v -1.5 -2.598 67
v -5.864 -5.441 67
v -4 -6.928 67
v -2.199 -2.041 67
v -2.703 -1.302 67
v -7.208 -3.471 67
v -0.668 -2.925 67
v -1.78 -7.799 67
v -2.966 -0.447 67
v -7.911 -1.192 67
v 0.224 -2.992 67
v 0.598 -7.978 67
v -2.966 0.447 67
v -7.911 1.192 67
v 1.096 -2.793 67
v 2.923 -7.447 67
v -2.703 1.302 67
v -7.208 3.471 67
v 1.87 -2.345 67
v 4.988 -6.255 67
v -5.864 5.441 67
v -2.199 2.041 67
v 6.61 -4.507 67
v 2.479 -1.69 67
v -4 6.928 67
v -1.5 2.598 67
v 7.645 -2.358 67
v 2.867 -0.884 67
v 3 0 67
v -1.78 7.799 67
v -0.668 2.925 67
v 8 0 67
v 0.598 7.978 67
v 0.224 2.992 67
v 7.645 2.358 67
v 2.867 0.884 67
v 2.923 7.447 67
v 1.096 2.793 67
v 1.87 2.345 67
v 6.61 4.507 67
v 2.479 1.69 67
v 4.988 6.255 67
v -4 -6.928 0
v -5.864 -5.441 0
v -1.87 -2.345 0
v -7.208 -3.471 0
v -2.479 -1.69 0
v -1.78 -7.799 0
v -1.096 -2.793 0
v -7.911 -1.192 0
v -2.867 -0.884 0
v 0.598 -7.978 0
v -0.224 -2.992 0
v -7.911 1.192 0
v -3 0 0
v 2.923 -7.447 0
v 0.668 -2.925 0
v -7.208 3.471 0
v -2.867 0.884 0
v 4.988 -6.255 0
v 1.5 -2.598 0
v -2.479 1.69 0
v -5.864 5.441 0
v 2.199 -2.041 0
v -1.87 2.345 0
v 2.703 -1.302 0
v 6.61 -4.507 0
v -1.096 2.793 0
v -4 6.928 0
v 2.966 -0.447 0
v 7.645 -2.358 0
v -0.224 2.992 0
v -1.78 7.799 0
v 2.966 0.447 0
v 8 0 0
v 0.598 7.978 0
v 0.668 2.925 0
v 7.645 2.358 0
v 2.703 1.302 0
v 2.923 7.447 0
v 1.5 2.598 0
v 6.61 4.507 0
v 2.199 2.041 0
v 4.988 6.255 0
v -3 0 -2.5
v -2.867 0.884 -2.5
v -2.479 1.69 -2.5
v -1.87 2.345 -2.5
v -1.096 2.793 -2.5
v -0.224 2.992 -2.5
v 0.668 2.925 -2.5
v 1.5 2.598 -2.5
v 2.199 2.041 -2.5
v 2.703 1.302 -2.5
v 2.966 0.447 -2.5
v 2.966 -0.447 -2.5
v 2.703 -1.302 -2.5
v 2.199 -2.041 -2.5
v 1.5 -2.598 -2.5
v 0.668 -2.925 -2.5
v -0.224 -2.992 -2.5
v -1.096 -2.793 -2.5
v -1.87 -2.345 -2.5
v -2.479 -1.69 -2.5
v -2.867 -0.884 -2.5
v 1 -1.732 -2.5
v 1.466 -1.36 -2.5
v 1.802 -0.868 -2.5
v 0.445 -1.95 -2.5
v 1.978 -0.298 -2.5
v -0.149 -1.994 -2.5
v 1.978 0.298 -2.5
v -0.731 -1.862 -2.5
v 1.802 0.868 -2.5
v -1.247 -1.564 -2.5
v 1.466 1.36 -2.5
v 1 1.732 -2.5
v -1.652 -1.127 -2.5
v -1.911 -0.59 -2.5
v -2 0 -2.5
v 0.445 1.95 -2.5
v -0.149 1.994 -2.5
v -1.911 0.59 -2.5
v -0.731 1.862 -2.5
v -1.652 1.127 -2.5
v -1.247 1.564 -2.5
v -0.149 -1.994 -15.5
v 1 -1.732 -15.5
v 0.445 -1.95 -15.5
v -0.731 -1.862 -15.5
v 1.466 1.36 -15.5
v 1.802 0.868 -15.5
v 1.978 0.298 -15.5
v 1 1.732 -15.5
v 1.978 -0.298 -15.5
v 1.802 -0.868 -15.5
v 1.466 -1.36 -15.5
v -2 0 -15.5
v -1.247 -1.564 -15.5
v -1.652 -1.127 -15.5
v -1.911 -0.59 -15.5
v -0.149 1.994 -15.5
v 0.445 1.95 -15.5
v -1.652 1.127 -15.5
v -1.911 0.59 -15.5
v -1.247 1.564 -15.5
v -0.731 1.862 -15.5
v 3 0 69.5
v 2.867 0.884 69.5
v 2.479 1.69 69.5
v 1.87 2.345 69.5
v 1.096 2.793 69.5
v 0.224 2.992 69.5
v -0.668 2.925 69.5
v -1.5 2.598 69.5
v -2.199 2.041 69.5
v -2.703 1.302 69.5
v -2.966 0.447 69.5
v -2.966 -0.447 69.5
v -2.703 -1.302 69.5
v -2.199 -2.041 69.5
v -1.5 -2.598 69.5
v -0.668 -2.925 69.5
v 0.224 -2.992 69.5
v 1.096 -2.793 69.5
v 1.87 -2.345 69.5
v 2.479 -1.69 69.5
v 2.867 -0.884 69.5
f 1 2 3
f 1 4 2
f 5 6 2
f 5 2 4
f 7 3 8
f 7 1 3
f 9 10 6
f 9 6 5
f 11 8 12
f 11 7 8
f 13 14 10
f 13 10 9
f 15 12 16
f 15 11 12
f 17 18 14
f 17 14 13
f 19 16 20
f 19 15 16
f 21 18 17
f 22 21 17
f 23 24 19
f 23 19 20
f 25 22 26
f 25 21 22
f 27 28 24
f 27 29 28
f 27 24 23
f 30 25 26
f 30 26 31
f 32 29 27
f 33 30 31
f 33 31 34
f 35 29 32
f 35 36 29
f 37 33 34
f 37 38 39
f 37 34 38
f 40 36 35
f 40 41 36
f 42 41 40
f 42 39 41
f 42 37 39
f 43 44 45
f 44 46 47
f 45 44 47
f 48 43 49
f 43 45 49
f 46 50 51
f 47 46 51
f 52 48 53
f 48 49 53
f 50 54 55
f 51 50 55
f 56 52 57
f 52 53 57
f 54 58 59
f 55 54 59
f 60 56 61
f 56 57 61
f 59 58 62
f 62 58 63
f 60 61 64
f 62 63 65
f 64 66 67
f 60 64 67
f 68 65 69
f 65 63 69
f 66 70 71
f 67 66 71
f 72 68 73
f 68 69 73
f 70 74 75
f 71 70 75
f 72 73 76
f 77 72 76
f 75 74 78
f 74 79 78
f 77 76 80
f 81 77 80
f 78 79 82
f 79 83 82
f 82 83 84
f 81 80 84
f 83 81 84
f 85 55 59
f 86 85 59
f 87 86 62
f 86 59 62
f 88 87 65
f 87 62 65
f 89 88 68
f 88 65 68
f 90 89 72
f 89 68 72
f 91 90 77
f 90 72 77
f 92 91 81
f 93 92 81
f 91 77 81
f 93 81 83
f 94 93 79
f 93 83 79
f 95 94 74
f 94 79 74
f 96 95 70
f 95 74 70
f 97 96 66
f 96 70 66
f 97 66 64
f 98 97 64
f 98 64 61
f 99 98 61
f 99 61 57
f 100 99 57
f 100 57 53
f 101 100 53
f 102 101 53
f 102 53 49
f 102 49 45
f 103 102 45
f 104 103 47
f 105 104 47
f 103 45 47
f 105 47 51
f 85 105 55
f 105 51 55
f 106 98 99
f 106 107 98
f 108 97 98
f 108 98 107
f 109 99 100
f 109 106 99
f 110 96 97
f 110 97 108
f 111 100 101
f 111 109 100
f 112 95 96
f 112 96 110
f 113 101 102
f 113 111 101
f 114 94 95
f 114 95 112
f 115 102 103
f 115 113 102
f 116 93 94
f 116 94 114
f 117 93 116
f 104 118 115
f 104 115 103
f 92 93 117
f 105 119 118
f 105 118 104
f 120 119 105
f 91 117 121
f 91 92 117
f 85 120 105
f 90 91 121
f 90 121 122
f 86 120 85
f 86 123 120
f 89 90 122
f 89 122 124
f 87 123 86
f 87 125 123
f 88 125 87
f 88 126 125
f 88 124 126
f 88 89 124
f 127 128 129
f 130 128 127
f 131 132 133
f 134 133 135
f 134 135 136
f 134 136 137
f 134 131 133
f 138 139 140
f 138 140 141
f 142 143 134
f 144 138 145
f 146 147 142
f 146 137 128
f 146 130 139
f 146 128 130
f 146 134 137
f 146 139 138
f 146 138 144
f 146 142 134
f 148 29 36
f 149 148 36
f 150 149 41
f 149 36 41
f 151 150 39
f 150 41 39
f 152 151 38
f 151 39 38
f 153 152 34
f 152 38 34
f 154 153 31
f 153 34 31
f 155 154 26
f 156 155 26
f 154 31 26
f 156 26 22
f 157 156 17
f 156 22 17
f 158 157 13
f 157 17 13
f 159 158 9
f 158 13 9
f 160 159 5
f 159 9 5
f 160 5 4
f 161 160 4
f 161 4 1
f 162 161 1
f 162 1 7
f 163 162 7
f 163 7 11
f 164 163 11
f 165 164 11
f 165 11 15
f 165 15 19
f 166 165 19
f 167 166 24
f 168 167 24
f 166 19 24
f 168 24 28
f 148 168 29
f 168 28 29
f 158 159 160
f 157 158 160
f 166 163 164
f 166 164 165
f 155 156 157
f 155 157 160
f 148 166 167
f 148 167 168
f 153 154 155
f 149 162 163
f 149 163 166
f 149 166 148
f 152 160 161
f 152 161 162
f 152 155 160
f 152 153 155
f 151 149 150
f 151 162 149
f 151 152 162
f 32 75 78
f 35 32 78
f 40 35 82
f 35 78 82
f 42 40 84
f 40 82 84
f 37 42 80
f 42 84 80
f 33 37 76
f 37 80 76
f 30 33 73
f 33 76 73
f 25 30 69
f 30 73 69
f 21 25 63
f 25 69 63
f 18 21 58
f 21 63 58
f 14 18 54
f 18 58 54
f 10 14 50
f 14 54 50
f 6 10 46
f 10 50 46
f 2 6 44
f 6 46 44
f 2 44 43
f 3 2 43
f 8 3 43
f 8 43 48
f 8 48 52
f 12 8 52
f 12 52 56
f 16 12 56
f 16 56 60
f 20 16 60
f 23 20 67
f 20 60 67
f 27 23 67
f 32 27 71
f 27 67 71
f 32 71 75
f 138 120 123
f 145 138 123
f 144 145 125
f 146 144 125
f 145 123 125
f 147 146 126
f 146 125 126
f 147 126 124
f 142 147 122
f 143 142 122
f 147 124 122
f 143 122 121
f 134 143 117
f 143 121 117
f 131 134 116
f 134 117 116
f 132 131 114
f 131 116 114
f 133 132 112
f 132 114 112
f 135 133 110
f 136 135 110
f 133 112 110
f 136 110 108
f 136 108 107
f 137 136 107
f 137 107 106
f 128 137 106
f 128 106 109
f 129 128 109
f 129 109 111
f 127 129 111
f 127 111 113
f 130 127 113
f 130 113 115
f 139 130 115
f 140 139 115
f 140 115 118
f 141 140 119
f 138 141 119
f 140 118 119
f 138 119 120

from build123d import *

# Parameters (mm, degrees)
SKETCH1_R           = 8
BOSS_EXTRUDE1_DEPTH = 67
SKETCH2_R           = 3
BOSS_EXTRUDE2_DEPTH = 2.5
SKETCH3_R           = 3
BOSS_EXTRUDE3_DEPTH = 2.5
SKETCH4_R           = 2
BOSS_EXTRUDE4_DEPTH = 13


with BuildPart() as part:
    # Sketch1 → Boss-Extrude1 (new body)
    with BuildSketch(Plane.XY):
        Circle(SKETCH1_R)
    extrude(amount=BOSS_EXTRUDE1_DEPTH)

    # Sketch2 → Boss-Extrude2 (add)
    with BuildSketch(Plane.XY.offset(67)):
        Circle(SKETCH2_R)
    extrude(amount=BOSS_EXTRUDE2_DEPTH)

    # Sketch3 → Boss-Extrude3 (add)
    with BuildSketch(Plane(origin=(0, 0, 0), x_dir=(-1, 0, 0), z_dir=(0, 0, -1))):
        Circle(SKETCH3_R)
    extrude(amount=BOSS_EXTRUDE3_DEPTH)

    # Sketch4 → Boss-Extrude4 (add)
    with BuildSketch(Plane(origin=(0, 0, -2.5), x_dir=(-1, 0, 0), z_dir=(0, 0, -1))):
        Circle(SKETCH4_R)
    extrude(amount=BOSS_EXTRUDE4_DEPTH)


solid = part.part
